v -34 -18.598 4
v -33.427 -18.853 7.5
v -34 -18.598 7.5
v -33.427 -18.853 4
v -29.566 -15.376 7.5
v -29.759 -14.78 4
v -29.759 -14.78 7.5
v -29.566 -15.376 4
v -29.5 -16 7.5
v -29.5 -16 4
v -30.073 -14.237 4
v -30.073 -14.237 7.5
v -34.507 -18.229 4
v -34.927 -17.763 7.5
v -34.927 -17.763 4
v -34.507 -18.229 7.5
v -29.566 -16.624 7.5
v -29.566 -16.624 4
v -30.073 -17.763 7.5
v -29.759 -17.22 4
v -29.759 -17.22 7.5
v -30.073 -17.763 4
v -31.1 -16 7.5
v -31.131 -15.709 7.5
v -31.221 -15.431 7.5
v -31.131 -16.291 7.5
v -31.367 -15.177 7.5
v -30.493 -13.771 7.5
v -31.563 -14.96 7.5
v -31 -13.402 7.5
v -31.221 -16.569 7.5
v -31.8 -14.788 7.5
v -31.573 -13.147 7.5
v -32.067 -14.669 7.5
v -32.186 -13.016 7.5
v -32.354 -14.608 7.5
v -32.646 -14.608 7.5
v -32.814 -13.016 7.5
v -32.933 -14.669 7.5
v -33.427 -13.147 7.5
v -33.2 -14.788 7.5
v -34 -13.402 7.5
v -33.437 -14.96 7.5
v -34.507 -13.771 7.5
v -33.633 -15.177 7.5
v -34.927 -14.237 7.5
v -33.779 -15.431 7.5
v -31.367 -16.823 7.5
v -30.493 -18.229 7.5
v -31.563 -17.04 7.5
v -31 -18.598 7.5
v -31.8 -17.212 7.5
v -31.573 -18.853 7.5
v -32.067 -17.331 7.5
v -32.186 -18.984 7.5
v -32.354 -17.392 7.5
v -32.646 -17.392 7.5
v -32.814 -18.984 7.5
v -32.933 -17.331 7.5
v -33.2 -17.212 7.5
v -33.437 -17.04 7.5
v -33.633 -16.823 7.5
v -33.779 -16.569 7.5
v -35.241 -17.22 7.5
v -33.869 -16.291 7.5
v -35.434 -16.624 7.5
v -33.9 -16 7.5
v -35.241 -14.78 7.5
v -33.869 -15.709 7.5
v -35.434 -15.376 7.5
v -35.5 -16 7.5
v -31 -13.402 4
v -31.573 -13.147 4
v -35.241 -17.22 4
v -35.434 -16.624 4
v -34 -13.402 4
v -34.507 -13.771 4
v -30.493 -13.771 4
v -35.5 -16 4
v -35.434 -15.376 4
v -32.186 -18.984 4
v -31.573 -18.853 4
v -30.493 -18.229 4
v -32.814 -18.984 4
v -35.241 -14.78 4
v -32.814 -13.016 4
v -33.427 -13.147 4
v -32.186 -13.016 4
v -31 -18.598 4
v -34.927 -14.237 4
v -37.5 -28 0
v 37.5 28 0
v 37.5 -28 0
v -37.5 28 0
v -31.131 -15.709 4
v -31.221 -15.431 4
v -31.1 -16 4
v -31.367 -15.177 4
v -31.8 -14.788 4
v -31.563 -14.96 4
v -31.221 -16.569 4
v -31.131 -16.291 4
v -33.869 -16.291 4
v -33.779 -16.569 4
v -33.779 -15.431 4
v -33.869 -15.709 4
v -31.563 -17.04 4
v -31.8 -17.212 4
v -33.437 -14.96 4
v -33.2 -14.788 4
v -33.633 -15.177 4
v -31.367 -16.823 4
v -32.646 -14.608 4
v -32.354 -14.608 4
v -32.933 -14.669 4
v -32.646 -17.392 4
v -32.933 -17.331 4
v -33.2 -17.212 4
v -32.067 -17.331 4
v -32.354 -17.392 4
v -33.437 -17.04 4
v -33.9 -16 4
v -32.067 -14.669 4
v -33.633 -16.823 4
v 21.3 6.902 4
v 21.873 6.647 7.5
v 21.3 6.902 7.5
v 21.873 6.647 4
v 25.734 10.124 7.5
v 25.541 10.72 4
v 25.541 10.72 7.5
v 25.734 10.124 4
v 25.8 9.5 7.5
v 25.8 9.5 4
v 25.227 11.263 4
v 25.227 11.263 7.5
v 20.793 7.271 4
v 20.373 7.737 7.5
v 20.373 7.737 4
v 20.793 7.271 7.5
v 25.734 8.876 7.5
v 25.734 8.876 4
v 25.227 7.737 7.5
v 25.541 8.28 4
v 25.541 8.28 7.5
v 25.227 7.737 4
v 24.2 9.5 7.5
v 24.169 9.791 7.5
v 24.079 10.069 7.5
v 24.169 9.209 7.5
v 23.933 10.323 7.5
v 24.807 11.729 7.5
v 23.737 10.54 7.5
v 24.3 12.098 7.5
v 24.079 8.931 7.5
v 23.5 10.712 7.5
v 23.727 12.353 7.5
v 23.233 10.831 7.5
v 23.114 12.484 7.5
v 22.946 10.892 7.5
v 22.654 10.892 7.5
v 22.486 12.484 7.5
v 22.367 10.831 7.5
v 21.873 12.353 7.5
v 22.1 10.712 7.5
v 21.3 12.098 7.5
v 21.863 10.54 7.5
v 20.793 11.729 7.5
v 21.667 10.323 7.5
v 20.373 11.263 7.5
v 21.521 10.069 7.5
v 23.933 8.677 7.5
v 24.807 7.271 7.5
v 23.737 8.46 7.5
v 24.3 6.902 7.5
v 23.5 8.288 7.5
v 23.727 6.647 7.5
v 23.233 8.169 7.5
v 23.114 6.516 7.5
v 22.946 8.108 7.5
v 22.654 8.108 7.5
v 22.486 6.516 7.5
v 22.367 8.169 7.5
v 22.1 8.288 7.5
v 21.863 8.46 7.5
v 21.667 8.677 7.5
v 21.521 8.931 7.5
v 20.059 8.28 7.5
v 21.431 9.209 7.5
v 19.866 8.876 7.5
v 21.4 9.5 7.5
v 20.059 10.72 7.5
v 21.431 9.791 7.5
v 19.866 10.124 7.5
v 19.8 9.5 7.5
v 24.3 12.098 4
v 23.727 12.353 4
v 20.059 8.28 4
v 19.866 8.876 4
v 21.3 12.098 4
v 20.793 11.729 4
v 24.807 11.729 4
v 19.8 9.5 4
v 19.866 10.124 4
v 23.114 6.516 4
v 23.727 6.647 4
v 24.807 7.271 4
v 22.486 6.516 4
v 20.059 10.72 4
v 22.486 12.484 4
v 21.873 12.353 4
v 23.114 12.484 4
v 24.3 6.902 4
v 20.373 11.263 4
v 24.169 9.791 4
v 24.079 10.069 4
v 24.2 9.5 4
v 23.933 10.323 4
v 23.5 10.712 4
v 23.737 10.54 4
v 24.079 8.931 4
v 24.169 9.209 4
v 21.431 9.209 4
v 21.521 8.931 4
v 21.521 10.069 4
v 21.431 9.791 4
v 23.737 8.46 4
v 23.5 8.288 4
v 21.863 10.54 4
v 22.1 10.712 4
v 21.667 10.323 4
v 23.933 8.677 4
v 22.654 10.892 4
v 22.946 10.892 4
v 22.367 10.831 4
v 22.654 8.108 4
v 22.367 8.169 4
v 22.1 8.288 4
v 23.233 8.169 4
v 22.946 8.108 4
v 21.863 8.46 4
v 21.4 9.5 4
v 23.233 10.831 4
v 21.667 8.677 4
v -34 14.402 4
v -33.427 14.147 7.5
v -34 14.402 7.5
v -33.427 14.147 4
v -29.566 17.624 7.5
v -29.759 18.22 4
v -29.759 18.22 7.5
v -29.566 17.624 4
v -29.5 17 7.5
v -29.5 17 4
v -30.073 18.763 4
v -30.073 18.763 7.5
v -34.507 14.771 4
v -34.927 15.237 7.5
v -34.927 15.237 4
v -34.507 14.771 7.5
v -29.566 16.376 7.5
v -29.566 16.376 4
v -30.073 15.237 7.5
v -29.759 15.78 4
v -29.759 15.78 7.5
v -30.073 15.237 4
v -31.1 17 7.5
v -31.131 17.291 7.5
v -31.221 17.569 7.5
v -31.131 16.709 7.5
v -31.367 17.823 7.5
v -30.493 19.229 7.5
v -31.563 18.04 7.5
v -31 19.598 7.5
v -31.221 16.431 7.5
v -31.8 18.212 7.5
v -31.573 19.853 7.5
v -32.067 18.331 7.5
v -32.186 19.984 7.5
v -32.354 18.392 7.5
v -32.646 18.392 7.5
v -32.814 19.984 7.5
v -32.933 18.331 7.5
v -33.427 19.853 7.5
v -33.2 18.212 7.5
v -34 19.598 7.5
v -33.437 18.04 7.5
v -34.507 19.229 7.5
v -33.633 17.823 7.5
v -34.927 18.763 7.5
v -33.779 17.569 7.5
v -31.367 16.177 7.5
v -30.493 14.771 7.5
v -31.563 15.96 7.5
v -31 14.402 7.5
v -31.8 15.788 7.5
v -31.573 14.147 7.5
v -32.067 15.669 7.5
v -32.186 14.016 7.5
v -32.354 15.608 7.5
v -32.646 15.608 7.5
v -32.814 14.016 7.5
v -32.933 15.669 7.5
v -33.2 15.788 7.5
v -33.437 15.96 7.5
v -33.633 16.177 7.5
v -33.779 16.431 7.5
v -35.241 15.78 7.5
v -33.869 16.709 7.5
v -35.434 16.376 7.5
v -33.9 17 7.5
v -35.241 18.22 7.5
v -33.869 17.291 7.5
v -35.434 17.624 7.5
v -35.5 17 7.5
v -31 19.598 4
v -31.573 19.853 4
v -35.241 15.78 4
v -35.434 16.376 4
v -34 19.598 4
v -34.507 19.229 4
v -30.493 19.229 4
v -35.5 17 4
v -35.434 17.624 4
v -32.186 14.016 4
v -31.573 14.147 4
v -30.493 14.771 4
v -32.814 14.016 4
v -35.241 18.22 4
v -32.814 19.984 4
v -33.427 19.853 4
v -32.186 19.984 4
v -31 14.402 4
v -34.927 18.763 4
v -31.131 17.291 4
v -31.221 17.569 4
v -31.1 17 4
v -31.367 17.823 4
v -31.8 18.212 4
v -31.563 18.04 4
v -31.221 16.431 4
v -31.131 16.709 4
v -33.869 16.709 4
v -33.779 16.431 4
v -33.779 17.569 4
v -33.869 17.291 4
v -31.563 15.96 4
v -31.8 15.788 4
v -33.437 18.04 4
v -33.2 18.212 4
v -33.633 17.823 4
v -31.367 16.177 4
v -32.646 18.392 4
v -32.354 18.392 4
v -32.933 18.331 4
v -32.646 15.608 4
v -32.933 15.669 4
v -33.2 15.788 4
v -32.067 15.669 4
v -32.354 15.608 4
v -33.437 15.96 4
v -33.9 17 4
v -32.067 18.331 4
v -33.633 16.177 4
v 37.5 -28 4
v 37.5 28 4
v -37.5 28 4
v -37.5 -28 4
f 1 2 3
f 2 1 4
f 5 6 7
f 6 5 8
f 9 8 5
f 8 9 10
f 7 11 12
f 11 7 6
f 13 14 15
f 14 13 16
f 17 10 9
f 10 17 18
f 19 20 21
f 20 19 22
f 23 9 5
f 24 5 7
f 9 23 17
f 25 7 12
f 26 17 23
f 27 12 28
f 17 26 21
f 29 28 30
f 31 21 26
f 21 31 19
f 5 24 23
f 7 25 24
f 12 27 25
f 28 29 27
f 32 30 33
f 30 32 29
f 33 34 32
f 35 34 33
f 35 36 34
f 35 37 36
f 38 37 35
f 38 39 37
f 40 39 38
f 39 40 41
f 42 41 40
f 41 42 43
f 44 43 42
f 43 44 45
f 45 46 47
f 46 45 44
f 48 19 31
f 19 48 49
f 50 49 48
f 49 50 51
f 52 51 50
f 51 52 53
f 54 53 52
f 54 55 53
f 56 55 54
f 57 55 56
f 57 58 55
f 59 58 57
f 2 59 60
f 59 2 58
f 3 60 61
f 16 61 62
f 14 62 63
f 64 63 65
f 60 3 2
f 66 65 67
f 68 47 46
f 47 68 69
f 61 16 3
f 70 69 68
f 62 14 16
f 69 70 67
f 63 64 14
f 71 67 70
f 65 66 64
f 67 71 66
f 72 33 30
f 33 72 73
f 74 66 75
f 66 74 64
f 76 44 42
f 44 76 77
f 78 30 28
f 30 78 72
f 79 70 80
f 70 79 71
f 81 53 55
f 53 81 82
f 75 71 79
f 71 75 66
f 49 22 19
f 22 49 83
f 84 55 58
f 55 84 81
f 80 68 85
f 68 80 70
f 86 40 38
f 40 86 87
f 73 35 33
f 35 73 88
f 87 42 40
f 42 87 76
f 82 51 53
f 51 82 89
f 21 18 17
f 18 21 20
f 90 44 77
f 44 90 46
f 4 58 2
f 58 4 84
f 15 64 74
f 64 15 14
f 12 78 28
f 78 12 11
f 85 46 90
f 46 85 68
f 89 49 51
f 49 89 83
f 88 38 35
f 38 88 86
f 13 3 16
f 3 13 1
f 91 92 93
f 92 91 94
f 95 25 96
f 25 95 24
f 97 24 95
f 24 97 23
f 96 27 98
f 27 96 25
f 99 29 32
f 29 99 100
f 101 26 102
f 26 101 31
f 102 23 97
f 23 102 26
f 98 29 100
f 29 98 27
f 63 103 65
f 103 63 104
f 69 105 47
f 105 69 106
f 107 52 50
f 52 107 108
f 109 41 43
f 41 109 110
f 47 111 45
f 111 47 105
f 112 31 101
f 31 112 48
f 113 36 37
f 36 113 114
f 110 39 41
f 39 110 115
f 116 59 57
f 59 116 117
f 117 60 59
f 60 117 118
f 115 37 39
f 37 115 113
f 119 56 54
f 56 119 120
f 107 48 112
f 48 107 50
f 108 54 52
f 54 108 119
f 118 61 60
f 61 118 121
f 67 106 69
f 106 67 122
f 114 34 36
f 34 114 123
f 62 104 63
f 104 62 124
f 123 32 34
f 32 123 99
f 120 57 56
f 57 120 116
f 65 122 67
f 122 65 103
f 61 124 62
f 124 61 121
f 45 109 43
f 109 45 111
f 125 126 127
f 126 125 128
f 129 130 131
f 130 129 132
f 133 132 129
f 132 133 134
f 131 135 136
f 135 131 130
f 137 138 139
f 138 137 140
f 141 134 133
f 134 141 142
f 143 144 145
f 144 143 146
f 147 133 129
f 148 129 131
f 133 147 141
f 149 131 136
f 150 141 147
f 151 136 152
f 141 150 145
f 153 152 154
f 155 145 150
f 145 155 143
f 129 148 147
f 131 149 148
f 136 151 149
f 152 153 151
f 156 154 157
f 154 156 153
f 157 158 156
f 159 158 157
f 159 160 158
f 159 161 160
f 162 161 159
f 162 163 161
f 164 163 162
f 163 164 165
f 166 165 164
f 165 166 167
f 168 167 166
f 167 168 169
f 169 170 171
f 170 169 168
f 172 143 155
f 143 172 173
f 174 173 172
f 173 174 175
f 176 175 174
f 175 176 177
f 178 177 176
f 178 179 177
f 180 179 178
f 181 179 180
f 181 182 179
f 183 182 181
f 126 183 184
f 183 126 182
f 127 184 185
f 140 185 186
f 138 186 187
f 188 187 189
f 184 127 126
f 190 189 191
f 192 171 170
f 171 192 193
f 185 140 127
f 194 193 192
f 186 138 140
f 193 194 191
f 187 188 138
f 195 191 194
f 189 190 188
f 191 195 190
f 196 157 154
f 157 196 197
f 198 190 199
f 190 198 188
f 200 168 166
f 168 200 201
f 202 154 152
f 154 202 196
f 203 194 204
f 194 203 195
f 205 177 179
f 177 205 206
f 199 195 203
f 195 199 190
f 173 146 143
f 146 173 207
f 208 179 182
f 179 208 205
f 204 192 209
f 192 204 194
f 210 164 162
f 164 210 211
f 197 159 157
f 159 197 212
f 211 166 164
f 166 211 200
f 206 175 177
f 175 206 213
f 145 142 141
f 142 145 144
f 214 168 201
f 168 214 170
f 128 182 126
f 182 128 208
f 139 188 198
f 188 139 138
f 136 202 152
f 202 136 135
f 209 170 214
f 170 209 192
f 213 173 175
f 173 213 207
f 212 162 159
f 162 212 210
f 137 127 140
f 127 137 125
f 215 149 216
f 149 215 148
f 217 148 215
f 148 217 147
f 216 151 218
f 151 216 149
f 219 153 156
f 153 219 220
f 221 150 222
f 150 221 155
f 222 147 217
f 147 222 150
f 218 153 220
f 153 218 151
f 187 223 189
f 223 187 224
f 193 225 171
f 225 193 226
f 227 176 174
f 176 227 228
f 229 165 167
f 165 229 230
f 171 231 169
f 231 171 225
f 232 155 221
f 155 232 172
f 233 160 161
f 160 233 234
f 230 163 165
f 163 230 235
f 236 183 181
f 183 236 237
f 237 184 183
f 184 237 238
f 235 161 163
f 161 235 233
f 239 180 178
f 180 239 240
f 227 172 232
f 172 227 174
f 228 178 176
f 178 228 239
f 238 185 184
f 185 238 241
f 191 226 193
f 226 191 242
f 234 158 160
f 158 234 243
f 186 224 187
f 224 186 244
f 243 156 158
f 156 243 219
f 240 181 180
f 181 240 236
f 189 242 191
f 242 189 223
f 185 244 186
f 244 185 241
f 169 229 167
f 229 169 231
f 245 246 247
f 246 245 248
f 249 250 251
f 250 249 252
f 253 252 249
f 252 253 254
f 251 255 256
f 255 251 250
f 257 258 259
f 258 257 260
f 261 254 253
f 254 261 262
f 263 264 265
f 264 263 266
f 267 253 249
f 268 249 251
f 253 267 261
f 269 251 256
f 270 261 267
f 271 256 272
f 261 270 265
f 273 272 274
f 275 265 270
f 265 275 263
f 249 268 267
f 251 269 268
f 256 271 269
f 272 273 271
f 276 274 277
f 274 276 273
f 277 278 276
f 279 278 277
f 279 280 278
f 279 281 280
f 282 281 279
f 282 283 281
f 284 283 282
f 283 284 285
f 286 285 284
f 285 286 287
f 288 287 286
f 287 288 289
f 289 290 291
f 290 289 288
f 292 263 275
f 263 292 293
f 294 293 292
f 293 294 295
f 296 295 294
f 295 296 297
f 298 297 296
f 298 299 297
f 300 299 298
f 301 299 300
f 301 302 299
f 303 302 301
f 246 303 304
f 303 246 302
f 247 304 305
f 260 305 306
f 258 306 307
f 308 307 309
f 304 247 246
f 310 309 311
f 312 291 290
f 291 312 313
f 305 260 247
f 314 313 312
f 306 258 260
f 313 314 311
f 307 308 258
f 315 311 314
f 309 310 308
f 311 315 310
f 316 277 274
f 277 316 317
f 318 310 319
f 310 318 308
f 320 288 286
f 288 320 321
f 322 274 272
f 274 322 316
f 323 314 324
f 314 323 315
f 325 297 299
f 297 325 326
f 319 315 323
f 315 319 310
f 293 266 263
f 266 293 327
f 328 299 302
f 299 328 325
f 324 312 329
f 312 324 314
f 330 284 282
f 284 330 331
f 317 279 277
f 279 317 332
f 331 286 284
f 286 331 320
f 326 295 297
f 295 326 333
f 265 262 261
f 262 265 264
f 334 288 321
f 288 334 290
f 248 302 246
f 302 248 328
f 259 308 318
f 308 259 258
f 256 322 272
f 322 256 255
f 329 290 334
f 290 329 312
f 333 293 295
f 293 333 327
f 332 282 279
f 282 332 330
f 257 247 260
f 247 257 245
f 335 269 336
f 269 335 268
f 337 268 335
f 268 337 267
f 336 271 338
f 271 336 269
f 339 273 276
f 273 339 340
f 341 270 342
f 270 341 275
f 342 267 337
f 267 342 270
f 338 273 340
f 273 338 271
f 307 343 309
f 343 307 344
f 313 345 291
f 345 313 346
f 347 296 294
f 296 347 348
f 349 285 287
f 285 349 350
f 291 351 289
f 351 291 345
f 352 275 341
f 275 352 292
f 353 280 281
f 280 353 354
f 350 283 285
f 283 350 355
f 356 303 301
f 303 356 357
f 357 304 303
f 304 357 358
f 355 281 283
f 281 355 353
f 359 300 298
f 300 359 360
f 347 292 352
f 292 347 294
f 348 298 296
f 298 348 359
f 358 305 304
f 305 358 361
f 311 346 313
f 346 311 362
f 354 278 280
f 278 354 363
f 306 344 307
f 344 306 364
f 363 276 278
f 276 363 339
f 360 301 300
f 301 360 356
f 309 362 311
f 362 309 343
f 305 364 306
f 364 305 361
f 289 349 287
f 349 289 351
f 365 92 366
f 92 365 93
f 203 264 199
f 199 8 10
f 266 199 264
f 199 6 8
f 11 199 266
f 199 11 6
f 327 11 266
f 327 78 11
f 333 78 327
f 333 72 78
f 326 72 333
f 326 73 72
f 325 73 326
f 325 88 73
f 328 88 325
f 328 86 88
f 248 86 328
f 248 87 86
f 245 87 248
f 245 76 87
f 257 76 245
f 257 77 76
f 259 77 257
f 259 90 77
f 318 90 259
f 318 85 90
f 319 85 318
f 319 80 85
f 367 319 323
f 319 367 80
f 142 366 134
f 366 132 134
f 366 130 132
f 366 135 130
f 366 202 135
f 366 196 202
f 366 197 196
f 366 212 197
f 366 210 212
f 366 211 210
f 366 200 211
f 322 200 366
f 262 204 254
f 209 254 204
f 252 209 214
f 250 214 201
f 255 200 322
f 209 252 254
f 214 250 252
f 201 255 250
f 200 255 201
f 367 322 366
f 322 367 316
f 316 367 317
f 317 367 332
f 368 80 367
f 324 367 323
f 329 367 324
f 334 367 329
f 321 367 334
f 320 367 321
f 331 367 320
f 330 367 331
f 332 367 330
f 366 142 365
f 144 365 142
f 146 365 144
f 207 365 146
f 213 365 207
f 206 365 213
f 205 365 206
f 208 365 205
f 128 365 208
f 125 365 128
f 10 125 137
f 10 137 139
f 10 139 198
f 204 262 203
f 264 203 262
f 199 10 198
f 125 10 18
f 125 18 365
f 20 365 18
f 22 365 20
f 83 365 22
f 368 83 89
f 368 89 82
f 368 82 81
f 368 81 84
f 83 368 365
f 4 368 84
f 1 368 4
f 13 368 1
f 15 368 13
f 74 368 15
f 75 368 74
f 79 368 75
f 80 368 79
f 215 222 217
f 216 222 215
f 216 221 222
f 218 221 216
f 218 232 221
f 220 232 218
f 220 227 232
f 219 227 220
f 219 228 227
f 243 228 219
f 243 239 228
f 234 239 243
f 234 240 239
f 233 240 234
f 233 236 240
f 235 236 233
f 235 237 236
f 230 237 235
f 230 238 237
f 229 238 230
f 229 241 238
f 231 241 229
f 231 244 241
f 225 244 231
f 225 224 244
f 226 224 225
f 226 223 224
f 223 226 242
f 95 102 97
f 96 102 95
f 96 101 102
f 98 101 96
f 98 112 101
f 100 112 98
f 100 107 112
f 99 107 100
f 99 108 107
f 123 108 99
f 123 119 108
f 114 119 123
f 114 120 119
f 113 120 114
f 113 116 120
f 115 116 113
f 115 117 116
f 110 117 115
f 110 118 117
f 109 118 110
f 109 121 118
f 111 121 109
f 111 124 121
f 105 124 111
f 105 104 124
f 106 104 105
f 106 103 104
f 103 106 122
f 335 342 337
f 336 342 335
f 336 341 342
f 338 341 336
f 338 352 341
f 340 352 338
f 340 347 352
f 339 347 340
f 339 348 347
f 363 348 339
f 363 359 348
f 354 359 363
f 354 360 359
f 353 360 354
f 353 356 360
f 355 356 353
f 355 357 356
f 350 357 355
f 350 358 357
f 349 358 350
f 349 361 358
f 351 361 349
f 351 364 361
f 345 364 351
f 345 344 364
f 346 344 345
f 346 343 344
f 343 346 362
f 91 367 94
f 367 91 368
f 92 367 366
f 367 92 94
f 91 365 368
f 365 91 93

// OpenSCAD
x = 75;
y = 56;
d = 4; // ita atsumi
h = 3.5; // deppari
ita = [x,y,d];
ana1_loc = [5,12,0];
ana2_loc = [60.3,37.5,0];
ana3_loc = [5,45,0];

module ita(){
    cube(ita);
}

module ana(){
	difference(){
    		cylinder(r=3.0,d+h,$fs=0.1);
		translate([0,0,-1])
    		cylinder(r=1.4,d+h+2,$fs=0.1);
	}
}

translate(-ita/2+[0,0,d/2]){
	ita();
    translate(ana1_loc)
	ana();
    translate(ana2_loc)
	ana();
    translate(ana3_loc)
	ana();
}
